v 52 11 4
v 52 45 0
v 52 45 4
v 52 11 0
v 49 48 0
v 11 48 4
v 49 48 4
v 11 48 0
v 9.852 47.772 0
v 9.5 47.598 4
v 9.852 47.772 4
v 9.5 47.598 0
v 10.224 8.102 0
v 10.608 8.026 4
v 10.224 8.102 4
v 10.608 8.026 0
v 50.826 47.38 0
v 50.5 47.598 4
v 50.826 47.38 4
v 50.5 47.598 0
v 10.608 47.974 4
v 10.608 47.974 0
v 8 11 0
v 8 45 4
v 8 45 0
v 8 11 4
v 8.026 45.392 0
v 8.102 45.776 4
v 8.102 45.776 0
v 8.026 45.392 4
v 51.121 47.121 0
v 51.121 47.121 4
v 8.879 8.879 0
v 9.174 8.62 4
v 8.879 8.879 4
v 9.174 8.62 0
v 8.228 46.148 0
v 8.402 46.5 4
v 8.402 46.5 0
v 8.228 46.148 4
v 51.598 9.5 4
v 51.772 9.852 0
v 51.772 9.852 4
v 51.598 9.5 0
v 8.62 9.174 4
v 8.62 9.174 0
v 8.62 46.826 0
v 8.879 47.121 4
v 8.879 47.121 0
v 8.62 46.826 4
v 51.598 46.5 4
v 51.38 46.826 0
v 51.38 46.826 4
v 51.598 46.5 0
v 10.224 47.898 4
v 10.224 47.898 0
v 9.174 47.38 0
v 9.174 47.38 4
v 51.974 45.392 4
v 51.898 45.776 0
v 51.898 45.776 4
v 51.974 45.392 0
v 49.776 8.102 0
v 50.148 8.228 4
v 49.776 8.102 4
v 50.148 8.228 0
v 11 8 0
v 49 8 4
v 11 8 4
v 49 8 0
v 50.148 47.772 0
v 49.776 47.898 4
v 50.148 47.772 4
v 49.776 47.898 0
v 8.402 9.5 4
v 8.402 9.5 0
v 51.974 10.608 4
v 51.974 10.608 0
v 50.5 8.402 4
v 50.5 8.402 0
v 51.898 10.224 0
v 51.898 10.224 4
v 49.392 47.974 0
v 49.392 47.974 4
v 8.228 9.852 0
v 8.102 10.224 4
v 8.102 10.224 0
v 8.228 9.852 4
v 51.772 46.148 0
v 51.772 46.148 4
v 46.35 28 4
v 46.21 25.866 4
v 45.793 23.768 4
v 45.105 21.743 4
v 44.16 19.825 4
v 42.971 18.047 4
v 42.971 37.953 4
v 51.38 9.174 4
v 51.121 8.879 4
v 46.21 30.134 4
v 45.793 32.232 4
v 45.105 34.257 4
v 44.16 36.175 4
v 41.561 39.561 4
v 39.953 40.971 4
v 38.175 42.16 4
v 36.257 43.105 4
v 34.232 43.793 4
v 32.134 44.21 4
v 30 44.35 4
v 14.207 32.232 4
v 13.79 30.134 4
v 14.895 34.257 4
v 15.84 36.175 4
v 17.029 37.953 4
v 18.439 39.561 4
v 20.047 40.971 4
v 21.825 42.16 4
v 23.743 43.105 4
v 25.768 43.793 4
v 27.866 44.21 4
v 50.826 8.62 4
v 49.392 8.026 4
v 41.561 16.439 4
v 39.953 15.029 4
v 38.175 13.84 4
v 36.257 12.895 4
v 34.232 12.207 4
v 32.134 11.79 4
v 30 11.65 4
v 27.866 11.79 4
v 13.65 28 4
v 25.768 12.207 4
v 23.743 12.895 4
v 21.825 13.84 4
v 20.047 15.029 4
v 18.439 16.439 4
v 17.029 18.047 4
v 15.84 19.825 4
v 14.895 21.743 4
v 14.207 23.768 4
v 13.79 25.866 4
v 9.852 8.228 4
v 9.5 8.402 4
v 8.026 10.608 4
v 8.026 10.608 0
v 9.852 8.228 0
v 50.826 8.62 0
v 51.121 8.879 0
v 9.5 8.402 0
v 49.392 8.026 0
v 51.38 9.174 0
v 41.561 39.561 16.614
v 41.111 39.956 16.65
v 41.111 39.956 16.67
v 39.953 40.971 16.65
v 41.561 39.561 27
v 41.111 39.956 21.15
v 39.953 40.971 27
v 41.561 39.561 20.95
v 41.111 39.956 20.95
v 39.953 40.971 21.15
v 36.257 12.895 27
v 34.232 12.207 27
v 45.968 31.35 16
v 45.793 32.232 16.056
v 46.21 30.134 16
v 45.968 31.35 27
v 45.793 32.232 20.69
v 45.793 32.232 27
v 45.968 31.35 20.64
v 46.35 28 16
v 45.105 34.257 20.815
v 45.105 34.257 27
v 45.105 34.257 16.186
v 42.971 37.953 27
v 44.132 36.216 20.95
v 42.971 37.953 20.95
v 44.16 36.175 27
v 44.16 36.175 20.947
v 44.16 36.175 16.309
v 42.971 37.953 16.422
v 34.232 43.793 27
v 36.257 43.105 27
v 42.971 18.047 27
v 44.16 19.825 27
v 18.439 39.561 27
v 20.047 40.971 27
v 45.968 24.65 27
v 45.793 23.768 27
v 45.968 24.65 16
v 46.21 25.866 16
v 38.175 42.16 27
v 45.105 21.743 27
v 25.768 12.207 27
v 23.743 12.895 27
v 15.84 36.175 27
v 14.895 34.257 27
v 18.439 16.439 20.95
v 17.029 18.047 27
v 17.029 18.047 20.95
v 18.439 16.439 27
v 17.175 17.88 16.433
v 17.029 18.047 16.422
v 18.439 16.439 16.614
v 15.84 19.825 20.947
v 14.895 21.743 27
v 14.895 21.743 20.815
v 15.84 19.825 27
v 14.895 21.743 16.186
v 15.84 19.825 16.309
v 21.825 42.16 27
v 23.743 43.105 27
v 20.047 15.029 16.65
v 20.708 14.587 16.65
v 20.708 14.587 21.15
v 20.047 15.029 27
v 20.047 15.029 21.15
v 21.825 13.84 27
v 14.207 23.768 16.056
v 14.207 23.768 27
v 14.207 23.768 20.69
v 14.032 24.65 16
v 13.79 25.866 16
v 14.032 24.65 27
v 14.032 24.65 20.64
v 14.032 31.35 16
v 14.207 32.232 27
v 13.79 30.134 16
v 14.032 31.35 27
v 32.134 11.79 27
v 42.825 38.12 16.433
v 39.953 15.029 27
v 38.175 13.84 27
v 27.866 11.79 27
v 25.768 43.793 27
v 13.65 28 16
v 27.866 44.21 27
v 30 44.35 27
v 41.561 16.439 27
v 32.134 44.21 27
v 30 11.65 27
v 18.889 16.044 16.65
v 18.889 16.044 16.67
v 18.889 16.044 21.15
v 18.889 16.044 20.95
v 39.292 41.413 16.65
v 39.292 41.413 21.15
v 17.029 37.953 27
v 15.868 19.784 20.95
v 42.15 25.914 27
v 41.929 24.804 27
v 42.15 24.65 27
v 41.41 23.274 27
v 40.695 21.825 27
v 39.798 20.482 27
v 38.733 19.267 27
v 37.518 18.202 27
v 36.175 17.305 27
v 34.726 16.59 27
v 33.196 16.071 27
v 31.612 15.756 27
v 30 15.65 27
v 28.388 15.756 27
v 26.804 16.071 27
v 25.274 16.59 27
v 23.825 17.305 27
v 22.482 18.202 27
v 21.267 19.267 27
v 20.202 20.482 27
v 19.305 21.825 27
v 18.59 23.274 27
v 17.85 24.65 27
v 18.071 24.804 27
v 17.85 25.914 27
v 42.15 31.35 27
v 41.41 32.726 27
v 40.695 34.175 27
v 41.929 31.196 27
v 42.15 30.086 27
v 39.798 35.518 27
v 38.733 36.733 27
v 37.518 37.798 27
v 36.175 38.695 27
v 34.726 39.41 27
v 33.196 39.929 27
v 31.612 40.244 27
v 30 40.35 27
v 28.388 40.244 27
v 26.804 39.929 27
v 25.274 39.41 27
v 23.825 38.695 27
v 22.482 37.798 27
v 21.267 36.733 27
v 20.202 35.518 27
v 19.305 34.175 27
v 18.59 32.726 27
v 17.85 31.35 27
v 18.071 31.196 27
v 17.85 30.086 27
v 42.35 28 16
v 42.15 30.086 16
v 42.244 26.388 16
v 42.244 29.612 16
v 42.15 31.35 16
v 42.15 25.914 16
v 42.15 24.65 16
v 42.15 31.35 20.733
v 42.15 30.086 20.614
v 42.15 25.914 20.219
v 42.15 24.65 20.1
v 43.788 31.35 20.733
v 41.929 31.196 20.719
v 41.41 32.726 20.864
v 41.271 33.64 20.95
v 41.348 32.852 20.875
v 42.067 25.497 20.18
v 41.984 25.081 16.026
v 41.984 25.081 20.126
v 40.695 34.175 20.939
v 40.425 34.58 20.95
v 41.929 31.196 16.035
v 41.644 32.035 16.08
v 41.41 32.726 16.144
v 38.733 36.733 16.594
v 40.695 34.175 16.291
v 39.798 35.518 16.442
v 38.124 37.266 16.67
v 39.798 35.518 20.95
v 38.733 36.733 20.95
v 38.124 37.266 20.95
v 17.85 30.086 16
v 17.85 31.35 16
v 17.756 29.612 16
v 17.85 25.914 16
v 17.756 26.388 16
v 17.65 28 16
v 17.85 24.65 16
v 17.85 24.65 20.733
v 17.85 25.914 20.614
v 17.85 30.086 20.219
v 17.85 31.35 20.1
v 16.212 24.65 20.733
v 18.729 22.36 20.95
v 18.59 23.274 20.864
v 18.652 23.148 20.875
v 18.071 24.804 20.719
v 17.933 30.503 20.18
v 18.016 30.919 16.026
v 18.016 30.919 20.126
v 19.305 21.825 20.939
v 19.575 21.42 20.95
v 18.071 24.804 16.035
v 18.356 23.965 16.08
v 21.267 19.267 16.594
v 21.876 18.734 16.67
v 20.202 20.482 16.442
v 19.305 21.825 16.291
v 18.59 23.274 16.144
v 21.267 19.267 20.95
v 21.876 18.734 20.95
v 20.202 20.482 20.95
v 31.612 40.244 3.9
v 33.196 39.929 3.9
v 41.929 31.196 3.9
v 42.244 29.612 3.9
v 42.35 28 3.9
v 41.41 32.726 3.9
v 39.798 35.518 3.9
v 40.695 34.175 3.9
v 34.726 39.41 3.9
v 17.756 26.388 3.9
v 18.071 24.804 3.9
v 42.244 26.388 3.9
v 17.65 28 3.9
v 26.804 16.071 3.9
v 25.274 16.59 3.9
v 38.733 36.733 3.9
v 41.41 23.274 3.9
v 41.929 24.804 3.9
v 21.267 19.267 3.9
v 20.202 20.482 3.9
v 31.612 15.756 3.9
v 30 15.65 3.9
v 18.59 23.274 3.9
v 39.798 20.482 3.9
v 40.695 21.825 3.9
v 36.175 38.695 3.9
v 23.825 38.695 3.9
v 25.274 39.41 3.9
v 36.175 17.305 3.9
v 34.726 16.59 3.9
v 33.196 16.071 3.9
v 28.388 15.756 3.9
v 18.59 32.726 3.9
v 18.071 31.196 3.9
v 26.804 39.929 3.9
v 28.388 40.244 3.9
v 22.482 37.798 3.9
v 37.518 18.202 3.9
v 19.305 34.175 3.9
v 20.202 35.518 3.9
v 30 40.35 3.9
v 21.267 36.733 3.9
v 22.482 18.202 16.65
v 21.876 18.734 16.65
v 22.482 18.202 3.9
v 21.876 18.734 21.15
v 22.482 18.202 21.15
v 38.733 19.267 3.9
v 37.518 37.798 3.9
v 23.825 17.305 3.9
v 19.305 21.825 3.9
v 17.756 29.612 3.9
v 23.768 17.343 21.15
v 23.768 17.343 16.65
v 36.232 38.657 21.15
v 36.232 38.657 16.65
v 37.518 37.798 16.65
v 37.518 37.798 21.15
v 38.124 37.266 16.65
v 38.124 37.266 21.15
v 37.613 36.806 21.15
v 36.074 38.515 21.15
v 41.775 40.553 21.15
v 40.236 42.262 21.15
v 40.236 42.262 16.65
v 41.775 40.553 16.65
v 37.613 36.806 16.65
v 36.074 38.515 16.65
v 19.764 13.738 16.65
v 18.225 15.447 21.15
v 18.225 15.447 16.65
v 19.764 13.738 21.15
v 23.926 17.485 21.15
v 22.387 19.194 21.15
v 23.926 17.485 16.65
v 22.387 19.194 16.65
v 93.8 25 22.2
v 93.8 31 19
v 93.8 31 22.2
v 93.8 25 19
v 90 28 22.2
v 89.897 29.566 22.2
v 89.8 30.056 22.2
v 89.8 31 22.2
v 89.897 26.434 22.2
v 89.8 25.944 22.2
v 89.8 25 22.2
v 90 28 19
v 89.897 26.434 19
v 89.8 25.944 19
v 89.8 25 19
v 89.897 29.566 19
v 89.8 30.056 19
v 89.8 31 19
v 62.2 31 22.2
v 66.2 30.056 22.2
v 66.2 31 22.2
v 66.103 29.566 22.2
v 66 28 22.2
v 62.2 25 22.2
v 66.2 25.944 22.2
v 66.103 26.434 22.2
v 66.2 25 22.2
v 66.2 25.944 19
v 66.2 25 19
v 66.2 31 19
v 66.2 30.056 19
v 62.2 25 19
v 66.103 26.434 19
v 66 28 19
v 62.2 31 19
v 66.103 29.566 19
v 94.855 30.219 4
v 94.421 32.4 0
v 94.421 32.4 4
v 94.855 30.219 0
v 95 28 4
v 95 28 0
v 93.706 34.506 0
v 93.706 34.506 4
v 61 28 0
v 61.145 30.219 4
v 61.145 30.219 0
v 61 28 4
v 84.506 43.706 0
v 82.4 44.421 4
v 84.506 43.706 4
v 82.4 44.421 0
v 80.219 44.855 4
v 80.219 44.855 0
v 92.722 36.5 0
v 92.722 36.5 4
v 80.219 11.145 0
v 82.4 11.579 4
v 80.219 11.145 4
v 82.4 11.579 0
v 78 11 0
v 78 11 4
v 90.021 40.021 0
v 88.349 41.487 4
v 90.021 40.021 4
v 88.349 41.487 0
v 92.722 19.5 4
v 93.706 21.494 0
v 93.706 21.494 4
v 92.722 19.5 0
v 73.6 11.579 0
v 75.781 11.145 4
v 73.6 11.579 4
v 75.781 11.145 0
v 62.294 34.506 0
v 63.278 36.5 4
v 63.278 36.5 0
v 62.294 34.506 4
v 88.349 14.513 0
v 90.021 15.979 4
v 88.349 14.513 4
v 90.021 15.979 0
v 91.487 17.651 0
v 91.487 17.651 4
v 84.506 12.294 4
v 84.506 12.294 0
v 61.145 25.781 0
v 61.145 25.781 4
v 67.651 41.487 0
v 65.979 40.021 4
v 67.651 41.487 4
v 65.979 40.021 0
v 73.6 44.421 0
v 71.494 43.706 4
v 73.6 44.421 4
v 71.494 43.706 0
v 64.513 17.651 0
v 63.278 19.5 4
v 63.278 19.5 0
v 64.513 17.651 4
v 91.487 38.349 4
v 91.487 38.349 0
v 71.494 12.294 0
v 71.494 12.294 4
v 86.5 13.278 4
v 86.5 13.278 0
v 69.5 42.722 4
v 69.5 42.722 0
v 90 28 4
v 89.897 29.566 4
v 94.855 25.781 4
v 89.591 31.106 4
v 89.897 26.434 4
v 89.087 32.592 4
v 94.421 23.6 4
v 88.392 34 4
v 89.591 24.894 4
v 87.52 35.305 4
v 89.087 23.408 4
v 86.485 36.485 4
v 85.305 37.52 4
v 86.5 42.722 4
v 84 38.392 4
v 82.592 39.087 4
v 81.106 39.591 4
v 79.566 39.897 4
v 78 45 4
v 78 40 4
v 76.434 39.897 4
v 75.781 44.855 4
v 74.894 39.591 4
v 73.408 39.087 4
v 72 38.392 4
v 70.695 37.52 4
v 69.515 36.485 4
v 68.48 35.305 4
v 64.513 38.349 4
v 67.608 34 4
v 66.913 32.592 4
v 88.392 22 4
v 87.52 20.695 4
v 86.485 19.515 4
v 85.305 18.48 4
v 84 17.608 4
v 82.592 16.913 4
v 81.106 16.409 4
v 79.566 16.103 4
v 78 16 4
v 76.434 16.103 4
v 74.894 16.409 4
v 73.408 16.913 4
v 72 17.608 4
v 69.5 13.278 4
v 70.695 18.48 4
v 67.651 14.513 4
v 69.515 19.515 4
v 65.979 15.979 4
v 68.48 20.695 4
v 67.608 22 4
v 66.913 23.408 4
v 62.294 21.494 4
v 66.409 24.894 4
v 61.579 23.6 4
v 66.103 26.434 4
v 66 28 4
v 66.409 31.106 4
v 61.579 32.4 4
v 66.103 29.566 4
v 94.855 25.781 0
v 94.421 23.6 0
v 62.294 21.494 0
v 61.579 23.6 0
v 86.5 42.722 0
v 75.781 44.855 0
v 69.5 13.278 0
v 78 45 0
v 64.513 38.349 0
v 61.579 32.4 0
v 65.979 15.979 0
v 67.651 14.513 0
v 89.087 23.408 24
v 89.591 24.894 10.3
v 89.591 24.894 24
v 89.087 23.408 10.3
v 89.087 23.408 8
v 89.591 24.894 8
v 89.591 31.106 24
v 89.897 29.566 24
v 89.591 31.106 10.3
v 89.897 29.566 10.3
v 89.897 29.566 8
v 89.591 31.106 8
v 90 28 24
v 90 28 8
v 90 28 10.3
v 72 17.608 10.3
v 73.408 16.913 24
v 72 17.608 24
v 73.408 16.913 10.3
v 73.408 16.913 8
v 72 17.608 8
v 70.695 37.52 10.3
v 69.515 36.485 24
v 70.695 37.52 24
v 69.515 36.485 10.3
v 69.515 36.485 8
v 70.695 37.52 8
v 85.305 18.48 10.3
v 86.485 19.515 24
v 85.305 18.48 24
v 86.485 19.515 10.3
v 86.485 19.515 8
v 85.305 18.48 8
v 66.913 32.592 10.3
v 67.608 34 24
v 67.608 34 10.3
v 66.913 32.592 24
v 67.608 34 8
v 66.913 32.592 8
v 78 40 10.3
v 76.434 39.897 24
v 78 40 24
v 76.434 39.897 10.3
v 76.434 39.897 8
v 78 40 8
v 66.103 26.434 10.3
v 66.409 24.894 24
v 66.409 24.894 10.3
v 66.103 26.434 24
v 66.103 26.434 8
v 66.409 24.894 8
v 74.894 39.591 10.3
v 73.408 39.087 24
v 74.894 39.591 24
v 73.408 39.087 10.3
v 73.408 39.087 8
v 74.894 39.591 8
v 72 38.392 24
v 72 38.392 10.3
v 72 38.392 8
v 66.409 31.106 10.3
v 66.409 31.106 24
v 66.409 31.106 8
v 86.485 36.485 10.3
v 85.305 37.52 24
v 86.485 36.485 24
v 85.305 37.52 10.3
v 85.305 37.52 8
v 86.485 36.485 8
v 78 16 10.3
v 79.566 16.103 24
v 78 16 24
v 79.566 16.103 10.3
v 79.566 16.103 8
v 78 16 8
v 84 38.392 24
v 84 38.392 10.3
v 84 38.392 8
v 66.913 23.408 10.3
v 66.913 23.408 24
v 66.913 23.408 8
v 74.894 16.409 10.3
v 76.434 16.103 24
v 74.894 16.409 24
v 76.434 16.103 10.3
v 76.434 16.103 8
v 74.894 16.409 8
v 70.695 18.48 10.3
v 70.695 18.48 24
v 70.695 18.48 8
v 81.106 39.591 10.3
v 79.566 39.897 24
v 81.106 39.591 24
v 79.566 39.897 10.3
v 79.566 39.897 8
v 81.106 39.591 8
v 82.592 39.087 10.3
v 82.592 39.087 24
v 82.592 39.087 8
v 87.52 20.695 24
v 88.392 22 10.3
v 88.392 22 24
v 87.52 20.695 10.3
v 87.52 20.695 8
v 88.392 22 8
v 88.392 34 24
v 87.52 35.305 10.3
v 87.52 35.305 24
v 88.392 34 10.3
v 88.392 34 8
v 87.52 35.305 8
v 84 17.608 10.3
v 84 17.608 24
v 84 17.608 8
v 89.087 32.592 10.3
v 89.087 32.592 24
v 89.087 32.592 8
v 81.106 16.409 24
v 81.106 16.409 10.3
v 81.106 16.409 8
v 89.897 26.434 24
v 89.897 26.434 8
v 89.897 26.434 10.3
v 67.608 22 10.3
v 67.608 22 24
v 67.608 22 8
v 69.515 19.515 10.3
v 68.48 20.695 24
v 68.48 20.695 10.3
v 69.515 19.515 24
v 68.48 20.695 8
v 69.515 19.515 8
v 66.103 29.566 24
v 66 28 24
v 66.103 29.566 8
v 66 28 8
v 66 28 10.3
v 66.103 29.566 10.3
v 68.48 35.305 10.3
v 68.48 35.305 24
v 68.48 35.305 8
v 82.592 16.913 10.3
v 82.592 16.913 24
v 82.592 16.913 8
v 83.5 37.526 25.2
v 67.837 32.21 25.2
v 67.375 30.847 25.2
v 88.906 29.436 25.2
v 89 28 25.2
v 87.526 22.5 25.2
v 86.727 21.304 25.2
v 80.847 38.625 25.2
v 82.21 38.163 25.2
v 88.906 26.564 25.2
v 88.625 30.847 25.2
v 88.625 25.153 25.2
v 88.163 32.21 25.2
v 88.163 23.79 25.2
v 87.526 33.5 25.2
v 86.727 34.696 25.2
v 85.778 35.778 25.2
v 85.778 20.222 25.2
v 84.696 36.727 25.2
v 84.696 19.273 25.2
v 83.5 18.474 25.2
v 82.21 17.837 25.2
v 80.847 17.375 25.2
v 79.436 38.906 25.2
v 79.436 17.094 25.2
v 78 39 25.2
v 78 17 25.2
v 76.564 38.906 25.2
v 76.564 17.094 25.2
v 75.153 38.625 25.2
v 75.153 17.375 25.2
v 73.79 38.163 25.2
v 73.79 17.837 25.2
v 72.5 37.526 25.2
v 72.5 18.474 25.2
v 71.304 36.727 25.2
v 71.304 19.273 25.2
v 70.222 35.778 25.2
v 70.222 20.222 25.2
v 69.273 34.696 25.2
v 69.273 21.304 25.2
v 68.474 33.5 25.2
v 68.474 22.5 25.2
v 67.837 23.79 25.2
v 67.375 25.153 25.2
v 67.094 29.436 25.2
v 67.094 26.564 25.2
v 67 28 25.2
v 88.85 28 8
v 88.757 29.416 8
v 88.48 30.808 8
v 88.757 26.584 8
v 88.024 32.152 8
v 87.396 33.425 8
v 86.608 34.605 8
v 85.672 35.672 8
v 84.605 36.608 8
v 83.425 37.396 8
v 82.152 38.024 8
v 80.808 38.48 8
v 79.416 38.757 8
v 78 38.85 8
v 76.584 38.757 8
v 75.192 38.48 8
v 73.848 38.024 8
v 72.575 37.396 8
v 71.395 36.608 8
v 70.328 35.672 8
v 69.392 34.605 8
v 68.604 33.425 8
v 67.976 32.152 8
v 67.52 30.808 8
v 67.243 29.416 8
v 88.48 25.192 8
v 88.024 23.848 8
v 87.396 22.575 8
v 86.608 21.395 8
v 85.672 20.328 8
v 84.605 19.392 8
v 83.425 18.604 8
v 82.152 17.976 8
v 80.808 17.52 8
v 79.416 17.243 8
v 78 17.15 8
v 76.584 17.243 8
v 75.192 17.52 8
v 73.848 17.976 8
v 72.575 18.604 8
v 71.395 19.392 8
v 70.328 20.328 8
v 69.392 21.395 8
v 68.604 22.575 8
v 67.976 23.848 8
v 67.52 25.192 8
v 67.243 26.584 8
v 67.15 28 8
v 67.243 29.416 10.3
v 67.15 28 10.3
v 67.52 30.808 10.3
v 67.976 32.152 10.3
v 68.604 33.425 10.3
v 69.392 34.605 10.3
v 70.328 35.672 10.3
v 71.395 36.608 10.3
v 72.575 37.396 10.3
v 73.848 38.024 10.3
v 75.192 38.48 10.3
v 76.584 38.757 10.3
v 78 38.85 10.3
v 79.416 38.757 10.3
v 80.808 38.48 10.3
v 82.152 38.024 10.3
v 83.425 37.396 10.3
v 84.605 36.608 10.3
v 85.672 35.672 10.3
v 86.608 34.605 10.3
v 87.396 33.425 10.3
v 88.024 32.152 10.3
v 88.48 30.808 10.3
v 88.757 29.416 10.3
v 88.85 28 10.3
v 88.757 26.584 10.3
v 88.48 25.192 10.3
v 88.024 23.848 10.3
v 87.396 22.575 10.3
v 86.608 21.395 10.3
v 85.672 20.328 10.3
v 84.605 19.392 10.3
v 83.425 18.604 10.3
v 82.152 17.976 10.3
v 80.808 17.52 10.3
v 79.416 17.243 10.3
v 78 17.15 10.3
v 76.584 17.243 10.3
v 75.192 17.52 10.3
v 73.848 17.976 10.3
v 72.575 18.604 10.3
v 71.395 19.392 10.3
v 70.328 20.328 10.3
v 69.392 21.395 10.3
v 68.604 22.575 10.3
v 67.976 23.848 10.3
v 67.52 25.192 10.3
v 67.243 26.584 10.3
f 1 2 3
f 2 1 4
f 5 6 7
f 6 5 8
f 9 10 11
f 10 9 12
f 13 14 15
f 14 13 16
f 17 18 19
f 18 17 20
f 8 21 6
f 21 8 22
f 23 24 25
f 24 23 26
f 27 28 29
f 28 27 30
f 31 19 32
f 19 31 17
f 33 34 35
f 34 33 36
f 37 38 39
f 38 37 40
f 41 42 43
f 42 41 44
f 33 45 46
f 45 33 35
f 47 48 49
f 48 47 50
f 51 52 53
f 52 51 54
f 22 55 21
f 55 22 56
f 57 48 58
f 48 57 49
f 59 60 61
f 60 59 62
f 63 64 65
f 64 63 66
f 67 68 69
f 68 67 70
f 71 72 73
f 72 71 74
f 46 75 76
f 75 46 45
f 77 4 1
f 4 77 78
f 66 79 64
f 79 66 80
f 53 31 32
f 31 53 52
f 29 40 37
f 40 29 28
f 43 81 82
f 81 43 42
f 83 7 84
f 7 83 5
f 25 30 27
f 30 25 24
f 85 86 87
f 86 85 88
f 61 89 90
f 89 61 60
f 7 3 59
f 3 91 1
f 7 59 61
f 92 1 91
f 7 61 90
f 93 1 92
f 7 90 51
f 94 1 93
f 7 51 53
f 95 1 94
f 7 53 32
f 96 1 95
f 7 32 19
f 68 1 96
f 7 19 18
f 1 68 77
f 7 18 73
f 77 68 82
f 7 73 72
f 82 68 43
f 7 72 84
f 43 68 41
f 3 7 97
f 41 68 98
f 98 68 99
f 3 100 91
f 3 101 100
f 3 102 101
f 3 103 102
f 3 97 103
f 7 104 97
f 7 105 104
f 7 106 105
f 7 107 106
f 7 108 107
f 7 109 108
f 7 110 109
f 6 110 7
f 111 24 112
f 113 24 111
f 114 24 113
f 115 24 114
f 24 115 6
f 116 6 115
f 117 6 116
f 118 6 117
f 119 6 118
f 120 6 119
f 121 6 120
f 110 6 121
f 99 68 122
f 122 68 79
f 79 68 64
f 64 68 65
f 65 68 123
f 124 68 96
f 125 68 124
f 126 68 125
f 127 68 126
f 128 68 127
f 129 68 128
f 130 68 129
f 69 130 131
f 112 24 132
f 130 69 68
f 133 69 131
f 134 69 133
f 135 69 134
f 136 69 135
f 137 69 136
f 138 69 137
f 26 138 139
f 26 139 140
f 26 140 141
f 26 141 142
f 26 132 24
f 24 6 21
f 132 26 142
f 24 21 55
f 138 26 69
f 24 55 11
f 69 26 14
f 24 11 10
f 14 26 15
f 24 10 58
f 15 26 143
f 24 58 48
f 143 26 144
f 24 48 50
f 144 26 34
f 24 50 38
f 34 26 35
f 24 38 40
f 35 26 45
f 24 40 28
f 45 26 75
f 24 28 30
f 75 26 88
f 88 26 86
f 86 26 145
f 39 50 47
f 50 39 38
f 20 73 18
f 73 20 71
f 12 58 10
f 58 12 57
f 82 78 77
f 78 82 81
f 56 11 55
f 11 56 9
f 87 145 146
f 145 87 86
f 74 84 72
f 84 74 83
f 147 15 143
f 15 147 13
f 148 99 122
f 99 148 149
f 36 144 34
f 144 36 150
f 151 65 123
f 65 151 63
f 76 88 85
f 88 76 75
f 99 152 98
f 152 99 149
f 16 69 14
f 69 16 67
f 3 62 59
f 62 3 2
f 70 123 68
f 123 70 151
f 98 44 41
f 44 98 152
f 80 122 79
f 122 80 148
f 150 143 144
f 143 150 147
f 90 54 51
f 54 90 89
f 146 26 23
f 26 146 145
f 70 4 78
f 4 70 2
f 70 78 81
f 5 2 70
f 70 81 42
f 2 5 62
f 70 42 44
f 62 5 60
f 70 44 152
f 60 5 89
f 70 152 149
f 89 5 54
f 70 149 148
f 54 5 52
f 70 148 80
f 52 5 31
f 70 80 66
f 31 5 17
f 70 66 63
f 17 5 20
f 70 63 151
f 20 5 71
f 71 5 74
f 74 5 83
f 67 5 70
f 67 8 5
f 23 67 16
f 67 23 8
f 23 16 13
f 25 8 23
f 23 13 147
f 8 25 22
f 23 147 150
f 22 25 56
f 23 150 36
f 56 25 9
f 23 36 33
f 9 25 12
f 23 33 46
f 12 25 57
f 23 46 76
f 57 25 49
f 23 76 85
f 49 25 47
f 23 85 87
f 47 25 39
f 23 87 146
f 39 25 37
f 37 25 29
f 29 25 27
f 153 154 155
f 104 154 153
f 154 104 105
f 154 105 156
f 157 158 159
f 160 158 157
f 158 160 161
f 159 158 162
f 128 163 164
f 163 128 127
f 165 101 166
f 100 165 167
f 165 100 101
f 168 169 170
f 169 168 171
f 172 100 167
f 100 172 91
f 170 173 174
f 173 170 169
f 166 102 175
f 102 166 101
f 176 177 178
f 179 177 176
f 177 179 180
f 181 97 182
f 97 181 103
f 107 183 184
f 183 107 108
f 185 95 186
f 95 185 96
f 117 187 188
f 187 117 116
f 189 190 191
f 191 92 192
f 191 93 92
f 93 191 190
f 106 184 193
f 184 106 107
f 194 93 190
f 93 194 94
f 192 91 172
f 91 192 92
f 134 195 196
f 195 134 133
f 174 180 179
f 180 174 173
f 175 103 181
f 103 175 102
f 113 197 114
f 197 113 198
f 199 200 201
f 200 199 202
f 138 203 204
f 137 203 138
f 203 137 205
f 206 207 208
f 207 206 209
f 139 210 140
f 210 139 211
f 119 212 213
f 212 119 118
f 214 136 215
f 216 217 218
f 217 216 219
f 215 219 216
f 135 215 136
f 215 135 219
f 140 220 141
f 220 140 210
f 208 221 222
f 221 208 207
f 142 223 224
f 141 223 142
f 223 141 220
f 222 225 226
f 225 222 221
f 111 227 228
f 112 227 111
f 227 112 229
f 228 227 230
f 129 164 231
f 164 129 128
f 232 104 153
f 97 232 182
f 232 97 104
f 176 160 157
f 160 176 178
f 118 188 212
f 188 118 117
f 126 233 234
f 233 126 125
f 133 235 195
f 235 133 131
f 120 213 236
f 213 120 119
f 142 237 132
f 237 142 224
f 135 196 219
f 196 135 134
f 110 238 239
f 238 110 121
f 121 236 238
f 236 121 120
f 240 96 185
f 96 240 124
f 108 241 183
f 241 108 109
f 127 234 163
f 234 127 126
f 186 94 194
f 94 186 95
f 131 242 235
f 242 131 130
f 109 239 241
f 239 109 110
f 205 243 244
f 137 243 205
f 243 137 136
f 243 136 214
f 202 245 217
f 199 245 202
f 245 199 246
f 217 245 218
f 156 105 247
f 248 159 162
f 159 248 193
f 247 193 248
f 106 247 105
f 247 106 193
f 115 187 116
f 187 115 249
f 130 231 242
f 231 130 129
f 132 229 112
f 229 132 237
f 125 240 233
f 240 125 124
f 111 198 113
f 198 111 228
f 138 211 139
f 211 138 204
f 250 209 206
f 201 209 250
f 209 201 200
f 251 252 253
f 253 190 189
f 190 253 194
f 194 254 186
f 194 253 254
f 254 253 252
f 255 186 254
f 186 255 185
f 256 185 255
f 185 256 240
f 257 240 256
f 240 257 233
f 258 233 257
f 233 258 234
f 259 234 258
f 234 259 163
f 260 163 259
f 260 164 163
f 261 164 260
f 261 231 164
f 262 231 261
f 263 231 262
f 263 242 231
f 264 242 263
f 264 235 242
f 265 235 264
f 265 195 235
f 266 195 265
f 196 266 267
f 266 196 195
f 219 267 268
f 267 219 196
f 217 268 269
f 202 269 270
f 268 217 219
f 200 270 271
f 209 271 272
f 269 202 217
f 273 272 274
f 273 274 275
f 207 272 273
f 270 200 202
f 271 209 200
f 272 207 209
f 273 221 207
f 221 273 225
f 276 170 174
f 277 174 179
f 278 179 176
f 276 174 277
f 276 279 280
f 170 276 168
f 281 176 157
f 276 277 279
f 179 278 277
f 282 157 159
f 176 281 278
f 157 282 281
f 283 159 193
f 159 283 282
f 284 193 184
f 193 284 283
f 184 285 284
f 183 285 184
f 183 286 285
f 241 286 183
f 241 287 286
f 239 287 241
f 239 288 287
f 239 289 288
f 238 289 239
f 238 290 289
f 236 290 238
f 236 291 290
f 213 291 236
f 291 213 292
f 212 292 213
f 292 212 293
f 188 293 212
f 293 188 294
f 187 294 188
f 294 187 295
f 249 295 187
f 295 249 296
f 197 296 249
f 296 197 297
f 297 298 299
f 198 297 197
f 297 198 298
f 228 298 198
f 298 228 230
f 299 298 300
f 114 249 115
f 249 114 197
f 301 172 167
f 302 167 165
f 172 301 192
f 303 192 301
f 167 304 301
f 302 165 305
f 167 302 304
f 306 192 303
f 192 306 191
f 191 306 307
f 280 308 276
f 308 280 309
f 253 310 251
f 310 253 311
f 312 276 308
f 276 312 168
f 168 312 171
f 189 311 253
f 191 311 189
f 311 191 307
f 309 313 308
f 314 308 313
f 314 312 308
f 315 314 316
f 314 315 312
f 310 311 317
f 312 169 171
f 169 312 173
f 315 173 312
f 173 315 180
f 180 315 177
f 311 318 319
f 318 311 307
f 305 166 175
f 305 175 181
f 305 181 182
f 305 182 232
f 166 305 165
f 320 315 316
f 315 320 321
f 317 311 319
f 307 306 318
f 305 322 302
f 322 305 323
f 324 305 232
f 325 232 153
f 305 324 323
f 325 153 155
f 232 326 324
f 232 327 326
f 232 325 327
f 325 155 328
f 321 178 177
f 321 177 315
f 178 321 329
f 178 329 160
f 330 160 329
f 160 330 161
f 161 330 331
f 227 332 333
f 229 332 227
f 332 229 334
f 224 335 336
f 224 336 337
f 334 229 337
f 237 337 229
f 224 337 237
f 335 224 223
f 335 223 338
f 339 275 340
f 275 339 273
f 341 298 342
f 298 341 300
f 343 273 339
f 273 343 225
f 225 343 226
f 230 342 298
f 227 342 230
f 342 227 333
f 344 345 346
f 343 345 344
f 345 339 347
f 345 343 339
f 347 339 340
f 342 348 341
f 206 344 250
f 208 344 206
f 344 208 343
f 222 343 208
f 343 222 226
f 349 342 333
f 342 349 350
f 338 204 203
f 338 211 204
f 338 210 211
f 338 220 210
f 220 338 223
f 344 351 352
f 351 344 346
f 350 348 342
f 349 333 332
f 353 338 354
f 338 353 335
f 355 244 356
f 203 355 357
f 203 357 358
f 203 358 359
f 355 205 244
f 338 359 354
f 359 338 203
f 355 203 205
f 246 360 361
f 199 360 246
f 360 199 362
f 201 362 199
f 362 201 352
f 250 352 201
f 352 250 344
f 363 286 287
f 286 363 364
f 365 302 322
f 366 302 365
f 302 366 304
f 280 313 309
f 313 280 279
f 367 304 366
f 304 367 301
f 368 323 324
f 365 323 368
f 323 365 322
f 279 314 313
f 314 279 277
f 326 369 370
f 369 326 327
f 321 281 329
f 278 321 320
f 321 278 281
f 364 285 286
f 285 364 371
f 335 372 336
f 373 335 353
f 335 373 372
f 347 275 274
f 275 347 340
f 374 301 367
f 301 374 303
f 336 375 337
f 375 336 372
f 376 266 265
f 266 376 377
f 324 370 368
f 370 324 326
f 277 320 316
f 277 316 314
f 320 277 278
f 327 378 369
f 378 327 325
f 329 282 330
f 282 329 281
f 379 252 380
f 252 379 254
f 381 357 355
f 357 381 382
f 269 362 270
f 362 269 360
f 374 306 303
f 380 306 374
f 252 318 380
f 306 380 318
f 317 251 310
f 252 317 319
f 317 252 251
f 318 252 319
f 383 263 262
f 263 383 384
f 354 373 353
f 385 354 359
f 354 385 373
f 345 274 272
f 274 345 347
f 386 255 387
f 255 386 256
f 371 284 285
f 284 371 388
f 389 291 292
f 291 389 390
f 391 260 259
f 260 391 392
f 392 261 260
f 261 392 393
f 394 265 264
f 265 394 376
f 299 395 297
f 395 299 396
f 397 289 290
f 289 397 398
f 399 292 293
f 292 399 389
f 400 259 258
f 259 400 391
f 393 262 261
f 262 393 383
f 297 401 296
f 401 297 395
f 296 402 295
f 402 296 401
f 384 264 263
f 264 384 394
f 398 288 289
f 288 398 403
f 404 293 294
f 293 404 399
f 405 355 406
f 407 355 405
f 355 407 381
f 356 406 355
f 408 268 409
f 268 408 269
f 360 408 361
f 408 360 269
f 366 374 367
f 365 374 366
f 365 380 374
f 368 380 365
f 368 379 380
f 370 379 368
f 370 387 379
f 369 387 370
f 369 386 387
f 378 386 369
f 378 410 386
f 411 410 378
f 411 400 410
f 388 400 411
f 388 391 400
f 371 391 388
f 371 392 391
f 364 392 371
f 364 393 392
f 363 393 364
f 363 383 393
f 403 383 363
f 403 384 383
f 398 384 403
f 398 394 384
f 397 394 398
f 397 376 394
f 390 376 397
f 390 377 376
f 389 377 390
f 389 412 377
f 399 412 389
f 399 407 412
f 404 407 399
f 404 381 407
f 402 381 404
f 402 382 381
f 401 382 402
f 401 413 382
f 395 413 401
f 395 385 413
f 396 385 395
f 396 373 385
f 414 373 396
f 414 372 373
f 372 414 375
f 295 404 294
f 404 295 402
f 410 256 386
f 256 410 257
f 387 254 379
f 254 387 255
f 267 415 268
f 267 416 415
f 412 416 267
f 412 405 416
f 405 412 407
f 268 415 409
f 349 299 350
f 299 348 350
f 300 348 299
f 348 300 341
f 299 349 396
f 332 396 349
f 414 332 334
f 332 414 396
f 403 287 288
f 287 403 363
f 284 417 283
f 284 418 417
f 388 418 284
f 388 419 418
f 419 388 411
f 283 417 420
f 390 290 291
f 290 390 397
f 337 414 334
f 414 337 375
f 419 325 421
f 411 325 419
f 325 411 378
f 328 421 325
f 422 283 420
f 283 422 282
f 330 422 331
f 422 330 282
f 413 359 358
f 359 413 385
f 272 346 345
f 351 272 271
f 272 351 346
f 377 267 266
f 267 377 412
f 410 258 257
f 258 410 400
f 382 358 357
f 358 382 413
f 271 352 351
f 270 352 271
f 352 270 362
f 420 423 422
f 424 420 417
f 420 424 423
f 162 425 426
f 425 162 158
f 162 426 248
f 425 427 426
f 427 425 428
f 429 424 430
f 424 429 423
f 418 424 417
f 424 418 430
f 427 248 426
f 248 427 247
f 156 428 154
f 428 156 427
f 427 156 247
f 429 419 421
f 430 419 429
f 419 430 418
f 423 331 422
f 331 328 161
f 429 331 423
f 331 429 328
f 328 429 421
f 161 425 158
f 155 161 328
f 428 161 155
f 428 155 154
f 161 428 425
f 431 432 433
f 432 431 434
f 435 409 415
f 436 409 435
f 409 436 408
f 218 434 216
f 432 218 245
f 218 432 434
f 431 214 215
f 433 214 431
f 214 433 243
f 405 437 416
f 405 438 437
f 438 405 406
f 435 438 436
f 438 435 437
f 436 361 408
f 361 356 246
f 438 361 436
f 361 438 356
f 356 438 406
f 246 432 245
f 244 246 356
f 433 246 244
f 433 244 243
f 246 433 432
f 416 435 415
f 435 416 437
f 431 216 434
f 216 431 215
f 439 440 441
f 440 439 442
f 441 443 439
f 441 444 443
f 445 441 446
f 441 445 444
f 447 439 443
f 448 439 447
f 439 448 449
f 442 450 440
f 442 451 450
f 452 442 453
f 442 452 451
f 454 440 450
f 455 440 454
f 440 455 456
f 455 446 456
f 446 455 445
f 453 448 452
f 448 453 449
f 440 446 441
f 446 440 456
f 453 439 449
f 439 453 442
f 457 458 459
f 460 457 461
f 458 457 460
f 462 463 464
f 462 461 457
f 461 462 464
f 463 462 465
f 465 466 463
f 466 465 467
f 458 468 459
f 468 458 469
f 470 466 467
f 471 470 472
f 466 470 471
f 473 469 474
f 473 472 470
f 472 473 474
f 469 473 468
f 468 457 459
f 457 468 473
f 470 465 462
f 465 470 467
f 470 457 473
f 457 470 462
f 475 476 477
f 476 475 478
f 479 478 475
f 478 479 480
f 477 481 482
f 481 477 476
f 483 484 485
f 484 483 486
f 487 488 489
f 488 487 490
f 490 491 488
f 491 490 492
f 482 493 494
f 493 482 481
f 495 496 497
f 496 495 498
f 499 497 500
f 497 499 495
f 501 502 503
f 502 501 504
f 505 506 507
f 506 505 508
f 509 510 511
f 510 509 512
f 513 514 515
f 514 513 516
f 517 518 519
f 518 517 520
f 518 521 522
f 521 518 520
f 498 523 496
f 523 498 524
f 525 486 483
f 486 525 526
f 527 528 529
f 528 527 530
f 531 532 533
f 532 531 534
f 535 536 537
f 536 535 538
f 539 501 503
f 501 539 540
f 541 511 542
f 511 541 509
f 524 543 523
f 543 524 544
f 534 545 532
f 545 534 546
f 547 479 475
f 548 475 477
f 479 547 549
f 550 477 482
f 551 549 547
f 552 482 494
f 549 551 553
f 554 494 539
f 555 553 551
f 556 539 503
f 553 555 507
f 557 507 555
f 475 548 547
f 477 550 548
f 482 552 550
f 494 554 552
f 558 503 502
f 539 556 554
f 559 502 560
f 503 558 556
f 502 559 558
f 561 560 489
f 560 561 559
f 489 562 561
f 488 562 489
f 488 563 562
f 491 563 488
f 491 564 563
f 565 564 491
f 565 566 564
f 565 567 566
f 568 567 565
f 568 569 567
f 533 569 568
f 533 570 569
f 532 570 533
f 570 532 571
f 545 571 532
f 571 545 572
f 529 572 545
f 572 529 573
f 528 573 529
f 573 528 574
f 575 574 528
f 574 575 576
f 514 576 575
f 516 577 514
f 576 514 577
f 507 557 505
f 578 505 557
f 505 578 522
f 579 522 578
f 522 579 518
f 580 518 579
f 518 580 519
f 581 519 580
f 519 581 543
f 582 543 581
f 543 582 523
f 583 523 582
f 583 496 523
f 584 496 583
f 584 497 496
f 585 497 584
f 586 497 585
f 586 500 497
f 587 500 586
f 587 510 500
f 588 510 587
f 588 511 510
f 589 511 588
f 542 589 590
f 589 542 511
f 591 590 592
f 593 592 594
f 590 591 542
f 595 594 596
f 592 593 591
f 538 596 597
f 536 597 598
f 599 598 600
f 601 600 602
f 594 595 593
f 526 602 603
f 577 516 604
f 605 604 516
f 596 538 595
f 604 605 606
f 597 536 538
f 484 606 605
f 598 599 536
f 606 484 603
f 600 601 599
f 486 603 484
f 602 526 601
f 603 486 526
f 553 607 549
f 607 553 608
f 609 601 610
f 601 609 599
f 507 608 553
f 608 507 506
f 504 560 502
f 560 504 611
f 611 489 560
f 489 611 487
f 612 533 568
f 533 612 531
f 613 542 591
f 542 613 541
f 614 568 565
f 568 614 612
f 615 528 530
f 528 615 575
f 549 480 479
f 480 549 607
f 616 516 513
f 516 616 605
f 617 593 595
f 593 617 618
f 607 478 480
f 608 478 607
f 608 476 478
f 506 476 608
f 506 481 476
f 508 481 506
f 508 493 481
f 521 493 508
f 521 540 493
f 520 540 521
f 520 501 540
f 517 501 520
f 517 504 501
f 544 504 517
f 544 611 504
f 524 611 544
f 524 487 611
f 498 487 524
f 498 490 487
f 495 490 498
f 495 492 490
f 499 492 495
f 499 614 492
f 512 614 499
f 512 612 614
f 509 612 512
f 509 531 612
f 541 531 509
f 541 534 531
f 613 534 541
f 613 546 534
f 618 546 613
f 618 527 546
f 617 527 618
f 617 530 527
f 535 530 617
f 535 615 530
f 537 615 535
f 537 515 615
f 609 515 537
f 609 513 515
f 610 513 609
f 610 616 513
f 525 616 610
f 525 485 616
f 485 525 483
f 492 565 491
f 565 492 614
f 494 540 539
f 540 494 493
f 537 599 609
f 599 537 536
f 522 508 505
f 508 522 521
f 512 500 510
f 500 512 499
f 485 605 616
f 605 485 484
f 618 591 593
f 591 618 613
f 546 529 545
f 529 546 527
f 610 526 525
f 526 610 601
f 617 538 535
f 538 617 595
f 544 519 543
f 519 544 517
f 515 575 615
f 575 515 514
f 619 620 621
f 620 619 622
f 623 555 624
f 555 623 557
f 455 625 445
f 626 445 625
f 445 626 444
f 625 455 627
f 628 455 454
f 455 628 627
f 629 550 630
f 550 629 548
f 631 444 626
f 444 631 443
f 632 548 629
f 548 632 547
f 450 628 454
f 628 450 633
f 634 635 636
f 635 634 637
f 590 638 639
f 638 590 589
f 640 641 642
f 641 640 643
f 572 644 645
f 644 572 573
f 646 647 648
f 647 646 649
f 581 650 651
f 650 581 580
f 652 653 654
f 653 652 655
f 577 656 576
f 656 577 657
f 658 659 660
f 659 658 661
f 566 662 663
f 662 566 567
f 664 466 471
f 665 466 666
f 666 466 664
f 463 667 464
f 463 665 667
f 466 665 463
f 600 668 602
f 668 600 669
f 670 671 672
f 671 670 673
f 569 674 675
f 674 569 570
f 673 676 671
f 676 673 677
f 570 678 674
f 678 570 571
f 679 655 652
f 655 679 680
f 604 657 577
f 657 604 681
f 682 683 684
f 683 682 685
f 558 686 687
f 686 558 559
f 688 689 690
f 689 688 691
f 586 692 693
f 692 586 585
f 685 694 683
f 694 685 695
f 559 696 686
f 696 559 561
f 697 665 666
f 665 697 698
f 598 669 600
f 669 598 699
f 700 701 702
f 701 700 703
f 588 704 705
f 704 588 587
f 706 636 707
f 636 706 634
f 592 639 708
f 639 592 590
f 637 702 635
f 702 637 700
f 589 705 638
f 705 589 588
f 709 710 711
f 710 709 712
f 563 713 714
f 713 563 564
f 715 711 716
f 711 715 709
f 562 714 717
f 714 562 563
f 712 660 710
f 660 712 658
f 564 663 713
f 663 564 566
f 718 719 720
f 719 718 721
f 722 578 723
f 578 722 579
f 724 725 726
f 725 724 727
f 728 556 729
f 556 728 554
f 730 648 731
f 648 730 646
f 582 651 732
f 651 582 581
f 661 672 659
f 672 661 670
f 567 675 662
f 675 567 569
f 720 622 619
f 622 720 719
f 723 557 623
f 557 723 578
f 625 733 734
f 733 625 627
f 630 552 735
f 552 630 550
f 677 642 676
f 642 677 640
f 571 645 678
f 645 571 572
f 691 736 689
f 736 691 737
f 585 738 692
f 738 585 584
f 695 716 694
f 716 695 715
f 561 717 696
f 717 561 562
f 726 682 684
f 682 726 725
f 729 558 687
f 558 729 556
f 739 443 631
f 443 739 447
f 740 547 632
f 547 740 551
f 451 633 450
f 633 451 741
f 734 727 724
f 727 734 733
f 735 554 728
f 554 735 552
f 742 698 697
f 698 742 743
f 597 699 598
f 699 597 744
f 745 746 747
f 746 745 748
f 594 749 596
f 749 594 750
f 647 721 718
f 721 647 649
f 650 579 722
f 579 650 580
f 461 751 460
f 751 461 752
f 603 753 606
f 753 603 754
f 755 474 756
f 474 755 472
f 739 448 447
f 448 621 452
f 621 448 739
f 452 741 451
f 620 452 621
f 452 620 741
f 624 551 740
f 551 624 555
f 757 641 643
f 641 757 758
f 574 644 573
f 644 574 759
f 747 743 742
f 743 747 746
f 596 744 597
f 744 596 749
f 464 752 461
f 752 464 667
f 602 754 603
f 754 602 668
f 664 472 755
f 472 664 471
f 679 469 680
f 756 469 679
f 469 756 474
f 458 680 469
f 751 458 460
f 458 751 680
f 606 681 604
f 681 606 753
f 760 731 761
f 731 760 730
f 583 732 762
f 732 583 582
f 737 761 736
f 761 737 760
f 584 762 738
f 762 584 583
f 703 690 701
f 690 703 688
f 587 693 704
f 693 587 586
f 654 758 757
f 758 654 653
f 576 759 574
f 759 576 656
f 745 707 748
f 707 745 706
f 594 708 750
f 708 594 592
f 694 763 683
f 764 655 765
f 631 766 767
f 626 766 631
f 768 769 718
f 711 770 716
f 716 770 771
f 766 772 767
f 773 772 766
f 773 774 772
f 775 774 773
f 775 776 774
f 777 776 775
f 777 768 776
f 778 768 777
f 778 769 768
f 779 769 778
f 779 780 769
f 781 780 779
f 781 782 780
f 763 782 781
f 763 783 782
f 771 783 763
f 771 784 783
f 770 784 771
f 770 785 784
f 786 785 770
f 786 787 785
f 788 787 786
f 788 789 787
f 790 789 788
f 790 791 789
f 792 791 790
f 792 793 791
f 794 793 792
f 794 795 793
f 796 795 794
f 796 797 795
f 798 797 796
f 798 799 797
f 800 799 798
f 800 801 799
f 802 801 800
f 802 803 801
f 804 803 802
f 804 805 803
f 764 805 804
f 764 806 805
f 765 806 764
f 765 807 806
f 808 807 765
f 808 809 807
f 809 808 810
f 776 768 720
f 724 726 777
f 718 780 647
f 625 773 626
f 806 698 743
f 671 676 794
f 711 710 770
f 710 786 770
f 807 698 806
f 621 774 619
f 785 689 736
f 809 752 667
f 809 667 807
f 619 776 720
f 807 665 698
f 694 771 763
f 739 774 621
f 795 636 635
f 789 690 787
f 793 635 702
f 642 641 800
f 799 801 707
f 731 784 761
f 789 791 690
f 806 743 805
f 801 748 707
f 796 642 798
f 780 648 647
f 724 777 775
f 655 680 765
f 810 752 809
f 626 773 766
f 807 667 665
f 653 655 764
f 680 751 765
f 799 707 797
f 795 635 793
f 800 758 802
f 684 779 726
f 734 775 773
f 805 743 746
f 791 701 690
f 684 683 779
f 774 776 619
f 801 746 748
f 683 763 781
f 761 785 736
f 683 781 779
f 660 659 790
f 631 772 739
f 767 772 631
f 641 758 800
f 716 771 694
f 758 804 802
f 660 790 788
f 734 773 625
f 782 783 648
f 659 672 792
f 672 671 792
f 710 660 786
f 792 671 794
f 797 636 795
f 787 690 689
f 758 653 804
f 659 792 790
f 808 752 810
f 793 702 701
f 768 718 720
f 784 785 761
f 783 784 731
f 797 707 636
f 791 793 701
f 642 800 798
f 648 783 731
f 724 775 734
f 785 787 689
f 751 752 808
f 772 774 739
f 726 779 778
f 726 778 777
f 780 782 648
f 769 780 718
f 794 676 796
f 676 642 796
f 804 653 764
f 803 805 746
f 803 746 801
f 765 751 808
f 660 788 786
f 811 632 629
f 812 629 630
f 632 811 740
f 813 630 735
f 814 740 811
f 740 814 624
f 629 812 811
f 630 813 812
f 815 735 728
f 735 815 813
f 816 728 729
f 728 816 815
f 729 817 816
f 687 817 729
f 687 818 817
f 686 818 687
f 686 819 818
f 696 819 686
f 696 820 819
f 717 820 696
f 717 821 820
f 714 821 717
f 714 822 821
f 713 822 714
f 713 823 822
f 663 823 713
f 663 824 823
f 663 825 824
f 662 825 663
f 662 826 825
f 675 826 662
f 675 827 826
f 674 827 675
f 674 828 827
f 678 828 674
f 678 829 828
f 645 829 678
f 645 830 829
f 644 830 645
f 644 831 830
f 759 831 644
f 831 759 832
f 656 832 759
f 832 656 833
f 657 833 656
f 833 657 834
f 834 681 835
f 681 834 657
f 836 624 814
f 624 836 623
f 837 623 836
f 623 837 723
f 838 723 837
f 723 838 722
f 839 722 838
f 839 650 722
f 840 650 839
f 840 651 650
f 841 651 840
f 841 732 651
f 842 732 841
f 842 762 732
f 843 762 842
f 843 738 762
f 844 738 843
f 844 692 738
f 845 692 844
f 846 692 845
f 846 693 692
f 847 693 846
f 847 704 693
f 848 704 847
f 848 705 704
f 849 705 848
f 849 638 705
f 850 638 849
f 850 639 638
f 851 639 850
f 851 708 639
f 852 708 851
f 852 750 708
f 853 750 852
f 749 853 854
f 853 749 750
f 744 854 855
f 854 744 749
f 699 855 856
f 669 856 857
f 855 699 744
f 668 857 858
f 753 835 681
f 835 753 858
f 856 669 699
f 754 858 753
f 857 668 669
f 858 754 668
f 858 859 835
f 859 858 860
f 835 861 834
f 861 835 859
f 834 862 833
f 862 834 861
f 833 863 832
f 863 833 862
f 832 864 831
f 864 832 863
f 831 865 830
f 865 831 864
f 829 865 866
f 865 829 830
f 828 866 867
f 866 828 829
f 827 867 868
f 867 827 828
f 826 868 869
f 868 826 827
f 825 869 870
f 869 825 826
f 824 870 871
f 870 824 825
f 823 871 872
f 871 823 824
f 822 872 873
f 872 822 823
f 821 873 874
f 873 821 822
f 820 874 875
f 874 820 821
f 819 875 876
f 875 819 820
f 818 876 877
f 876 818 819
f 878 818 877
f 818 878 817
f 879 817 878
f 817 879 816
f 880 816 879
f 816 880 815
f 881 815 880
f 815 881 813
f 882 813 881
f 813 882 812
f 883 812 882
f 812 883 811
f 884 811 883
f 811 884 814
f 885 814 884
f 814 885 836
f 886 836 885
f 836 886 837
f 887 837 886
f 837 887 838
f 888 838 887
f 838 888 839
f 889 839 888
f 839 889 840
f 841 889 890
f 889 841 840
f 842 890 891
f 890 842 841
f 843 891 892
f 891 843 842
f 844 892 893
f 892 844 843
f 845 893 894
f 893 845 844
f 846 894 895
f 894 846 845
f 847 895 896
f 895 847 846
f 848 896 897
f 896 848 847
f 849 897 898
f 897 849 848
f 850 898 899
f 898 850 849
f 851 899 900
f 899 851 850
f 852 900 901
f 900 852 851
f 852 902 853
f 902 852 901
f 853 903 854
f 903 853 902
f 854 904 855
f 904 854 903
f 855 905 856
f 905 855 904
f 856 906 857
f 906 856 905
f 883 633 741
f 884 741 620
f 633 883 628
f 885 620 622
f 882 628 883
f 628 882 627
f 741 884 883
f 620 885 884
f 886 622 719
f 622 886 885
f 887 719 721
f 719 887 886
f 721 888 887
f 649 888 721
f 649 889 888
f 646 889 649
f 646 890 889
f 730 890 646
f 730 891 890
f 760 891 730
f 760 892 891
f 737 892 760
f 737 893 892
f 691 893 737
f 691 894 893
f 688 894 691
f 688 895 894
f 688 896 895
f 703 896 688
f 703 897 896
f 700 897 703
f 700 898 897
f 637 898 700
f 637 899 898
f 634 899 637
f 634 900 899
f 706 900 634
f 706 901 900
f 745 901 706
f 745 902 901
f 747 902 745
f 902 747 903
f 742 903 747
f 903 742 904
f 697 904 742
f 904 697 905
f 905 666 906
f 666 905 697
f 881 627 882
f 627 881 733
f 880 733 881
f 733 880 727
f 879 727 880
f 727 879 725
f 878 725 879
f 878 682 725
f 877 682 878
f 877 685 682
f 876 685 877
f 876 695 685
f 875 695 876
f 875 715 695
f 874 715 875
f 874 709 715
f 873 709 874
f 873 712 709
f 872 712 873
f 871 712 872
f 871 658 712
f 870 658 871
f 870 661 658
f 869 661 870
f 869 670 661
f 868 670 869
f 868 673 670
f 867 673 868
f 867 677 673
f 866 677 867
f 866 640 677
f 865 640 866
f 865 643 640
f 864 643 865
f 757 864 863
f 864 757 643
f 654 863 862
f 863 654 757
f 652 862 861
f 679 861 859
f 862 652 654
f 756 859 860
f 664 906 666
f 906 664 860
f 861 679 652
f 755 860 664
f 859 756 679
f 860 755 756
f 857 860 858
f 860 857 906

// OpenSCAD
/*
Sample 128: O-Ring-vorgespanntes Rampenbajonett — 25 % radiale Kompression
Generated from the FDM Mechanical Sample Library.
Units: millimetres.

Override examples:
  openscad -o custom.stl -D 'view="plate"' -D 'render_fn=64' model.scad
  openscad -o preview.png -D 'view="assembly"' model.scad
*/
use <../../../library/fdm_mechanisms.scad>

render_fn = is_undef(render_fn) ? 48 : render_fn;
view = is_undef(view) ? "plate" : view;
$fn = render_fn;

sample_ramped_bayonet(
    view=view,
    core_d=24,
    running_clearance=0.35,
    lug_w=6,
    ramp_h=0.85,
    turn_deg=42,
    oring_id=21,
    oring_cs=2,
    radial_squeeze=0.25,
    hard_stop=1.5
);
